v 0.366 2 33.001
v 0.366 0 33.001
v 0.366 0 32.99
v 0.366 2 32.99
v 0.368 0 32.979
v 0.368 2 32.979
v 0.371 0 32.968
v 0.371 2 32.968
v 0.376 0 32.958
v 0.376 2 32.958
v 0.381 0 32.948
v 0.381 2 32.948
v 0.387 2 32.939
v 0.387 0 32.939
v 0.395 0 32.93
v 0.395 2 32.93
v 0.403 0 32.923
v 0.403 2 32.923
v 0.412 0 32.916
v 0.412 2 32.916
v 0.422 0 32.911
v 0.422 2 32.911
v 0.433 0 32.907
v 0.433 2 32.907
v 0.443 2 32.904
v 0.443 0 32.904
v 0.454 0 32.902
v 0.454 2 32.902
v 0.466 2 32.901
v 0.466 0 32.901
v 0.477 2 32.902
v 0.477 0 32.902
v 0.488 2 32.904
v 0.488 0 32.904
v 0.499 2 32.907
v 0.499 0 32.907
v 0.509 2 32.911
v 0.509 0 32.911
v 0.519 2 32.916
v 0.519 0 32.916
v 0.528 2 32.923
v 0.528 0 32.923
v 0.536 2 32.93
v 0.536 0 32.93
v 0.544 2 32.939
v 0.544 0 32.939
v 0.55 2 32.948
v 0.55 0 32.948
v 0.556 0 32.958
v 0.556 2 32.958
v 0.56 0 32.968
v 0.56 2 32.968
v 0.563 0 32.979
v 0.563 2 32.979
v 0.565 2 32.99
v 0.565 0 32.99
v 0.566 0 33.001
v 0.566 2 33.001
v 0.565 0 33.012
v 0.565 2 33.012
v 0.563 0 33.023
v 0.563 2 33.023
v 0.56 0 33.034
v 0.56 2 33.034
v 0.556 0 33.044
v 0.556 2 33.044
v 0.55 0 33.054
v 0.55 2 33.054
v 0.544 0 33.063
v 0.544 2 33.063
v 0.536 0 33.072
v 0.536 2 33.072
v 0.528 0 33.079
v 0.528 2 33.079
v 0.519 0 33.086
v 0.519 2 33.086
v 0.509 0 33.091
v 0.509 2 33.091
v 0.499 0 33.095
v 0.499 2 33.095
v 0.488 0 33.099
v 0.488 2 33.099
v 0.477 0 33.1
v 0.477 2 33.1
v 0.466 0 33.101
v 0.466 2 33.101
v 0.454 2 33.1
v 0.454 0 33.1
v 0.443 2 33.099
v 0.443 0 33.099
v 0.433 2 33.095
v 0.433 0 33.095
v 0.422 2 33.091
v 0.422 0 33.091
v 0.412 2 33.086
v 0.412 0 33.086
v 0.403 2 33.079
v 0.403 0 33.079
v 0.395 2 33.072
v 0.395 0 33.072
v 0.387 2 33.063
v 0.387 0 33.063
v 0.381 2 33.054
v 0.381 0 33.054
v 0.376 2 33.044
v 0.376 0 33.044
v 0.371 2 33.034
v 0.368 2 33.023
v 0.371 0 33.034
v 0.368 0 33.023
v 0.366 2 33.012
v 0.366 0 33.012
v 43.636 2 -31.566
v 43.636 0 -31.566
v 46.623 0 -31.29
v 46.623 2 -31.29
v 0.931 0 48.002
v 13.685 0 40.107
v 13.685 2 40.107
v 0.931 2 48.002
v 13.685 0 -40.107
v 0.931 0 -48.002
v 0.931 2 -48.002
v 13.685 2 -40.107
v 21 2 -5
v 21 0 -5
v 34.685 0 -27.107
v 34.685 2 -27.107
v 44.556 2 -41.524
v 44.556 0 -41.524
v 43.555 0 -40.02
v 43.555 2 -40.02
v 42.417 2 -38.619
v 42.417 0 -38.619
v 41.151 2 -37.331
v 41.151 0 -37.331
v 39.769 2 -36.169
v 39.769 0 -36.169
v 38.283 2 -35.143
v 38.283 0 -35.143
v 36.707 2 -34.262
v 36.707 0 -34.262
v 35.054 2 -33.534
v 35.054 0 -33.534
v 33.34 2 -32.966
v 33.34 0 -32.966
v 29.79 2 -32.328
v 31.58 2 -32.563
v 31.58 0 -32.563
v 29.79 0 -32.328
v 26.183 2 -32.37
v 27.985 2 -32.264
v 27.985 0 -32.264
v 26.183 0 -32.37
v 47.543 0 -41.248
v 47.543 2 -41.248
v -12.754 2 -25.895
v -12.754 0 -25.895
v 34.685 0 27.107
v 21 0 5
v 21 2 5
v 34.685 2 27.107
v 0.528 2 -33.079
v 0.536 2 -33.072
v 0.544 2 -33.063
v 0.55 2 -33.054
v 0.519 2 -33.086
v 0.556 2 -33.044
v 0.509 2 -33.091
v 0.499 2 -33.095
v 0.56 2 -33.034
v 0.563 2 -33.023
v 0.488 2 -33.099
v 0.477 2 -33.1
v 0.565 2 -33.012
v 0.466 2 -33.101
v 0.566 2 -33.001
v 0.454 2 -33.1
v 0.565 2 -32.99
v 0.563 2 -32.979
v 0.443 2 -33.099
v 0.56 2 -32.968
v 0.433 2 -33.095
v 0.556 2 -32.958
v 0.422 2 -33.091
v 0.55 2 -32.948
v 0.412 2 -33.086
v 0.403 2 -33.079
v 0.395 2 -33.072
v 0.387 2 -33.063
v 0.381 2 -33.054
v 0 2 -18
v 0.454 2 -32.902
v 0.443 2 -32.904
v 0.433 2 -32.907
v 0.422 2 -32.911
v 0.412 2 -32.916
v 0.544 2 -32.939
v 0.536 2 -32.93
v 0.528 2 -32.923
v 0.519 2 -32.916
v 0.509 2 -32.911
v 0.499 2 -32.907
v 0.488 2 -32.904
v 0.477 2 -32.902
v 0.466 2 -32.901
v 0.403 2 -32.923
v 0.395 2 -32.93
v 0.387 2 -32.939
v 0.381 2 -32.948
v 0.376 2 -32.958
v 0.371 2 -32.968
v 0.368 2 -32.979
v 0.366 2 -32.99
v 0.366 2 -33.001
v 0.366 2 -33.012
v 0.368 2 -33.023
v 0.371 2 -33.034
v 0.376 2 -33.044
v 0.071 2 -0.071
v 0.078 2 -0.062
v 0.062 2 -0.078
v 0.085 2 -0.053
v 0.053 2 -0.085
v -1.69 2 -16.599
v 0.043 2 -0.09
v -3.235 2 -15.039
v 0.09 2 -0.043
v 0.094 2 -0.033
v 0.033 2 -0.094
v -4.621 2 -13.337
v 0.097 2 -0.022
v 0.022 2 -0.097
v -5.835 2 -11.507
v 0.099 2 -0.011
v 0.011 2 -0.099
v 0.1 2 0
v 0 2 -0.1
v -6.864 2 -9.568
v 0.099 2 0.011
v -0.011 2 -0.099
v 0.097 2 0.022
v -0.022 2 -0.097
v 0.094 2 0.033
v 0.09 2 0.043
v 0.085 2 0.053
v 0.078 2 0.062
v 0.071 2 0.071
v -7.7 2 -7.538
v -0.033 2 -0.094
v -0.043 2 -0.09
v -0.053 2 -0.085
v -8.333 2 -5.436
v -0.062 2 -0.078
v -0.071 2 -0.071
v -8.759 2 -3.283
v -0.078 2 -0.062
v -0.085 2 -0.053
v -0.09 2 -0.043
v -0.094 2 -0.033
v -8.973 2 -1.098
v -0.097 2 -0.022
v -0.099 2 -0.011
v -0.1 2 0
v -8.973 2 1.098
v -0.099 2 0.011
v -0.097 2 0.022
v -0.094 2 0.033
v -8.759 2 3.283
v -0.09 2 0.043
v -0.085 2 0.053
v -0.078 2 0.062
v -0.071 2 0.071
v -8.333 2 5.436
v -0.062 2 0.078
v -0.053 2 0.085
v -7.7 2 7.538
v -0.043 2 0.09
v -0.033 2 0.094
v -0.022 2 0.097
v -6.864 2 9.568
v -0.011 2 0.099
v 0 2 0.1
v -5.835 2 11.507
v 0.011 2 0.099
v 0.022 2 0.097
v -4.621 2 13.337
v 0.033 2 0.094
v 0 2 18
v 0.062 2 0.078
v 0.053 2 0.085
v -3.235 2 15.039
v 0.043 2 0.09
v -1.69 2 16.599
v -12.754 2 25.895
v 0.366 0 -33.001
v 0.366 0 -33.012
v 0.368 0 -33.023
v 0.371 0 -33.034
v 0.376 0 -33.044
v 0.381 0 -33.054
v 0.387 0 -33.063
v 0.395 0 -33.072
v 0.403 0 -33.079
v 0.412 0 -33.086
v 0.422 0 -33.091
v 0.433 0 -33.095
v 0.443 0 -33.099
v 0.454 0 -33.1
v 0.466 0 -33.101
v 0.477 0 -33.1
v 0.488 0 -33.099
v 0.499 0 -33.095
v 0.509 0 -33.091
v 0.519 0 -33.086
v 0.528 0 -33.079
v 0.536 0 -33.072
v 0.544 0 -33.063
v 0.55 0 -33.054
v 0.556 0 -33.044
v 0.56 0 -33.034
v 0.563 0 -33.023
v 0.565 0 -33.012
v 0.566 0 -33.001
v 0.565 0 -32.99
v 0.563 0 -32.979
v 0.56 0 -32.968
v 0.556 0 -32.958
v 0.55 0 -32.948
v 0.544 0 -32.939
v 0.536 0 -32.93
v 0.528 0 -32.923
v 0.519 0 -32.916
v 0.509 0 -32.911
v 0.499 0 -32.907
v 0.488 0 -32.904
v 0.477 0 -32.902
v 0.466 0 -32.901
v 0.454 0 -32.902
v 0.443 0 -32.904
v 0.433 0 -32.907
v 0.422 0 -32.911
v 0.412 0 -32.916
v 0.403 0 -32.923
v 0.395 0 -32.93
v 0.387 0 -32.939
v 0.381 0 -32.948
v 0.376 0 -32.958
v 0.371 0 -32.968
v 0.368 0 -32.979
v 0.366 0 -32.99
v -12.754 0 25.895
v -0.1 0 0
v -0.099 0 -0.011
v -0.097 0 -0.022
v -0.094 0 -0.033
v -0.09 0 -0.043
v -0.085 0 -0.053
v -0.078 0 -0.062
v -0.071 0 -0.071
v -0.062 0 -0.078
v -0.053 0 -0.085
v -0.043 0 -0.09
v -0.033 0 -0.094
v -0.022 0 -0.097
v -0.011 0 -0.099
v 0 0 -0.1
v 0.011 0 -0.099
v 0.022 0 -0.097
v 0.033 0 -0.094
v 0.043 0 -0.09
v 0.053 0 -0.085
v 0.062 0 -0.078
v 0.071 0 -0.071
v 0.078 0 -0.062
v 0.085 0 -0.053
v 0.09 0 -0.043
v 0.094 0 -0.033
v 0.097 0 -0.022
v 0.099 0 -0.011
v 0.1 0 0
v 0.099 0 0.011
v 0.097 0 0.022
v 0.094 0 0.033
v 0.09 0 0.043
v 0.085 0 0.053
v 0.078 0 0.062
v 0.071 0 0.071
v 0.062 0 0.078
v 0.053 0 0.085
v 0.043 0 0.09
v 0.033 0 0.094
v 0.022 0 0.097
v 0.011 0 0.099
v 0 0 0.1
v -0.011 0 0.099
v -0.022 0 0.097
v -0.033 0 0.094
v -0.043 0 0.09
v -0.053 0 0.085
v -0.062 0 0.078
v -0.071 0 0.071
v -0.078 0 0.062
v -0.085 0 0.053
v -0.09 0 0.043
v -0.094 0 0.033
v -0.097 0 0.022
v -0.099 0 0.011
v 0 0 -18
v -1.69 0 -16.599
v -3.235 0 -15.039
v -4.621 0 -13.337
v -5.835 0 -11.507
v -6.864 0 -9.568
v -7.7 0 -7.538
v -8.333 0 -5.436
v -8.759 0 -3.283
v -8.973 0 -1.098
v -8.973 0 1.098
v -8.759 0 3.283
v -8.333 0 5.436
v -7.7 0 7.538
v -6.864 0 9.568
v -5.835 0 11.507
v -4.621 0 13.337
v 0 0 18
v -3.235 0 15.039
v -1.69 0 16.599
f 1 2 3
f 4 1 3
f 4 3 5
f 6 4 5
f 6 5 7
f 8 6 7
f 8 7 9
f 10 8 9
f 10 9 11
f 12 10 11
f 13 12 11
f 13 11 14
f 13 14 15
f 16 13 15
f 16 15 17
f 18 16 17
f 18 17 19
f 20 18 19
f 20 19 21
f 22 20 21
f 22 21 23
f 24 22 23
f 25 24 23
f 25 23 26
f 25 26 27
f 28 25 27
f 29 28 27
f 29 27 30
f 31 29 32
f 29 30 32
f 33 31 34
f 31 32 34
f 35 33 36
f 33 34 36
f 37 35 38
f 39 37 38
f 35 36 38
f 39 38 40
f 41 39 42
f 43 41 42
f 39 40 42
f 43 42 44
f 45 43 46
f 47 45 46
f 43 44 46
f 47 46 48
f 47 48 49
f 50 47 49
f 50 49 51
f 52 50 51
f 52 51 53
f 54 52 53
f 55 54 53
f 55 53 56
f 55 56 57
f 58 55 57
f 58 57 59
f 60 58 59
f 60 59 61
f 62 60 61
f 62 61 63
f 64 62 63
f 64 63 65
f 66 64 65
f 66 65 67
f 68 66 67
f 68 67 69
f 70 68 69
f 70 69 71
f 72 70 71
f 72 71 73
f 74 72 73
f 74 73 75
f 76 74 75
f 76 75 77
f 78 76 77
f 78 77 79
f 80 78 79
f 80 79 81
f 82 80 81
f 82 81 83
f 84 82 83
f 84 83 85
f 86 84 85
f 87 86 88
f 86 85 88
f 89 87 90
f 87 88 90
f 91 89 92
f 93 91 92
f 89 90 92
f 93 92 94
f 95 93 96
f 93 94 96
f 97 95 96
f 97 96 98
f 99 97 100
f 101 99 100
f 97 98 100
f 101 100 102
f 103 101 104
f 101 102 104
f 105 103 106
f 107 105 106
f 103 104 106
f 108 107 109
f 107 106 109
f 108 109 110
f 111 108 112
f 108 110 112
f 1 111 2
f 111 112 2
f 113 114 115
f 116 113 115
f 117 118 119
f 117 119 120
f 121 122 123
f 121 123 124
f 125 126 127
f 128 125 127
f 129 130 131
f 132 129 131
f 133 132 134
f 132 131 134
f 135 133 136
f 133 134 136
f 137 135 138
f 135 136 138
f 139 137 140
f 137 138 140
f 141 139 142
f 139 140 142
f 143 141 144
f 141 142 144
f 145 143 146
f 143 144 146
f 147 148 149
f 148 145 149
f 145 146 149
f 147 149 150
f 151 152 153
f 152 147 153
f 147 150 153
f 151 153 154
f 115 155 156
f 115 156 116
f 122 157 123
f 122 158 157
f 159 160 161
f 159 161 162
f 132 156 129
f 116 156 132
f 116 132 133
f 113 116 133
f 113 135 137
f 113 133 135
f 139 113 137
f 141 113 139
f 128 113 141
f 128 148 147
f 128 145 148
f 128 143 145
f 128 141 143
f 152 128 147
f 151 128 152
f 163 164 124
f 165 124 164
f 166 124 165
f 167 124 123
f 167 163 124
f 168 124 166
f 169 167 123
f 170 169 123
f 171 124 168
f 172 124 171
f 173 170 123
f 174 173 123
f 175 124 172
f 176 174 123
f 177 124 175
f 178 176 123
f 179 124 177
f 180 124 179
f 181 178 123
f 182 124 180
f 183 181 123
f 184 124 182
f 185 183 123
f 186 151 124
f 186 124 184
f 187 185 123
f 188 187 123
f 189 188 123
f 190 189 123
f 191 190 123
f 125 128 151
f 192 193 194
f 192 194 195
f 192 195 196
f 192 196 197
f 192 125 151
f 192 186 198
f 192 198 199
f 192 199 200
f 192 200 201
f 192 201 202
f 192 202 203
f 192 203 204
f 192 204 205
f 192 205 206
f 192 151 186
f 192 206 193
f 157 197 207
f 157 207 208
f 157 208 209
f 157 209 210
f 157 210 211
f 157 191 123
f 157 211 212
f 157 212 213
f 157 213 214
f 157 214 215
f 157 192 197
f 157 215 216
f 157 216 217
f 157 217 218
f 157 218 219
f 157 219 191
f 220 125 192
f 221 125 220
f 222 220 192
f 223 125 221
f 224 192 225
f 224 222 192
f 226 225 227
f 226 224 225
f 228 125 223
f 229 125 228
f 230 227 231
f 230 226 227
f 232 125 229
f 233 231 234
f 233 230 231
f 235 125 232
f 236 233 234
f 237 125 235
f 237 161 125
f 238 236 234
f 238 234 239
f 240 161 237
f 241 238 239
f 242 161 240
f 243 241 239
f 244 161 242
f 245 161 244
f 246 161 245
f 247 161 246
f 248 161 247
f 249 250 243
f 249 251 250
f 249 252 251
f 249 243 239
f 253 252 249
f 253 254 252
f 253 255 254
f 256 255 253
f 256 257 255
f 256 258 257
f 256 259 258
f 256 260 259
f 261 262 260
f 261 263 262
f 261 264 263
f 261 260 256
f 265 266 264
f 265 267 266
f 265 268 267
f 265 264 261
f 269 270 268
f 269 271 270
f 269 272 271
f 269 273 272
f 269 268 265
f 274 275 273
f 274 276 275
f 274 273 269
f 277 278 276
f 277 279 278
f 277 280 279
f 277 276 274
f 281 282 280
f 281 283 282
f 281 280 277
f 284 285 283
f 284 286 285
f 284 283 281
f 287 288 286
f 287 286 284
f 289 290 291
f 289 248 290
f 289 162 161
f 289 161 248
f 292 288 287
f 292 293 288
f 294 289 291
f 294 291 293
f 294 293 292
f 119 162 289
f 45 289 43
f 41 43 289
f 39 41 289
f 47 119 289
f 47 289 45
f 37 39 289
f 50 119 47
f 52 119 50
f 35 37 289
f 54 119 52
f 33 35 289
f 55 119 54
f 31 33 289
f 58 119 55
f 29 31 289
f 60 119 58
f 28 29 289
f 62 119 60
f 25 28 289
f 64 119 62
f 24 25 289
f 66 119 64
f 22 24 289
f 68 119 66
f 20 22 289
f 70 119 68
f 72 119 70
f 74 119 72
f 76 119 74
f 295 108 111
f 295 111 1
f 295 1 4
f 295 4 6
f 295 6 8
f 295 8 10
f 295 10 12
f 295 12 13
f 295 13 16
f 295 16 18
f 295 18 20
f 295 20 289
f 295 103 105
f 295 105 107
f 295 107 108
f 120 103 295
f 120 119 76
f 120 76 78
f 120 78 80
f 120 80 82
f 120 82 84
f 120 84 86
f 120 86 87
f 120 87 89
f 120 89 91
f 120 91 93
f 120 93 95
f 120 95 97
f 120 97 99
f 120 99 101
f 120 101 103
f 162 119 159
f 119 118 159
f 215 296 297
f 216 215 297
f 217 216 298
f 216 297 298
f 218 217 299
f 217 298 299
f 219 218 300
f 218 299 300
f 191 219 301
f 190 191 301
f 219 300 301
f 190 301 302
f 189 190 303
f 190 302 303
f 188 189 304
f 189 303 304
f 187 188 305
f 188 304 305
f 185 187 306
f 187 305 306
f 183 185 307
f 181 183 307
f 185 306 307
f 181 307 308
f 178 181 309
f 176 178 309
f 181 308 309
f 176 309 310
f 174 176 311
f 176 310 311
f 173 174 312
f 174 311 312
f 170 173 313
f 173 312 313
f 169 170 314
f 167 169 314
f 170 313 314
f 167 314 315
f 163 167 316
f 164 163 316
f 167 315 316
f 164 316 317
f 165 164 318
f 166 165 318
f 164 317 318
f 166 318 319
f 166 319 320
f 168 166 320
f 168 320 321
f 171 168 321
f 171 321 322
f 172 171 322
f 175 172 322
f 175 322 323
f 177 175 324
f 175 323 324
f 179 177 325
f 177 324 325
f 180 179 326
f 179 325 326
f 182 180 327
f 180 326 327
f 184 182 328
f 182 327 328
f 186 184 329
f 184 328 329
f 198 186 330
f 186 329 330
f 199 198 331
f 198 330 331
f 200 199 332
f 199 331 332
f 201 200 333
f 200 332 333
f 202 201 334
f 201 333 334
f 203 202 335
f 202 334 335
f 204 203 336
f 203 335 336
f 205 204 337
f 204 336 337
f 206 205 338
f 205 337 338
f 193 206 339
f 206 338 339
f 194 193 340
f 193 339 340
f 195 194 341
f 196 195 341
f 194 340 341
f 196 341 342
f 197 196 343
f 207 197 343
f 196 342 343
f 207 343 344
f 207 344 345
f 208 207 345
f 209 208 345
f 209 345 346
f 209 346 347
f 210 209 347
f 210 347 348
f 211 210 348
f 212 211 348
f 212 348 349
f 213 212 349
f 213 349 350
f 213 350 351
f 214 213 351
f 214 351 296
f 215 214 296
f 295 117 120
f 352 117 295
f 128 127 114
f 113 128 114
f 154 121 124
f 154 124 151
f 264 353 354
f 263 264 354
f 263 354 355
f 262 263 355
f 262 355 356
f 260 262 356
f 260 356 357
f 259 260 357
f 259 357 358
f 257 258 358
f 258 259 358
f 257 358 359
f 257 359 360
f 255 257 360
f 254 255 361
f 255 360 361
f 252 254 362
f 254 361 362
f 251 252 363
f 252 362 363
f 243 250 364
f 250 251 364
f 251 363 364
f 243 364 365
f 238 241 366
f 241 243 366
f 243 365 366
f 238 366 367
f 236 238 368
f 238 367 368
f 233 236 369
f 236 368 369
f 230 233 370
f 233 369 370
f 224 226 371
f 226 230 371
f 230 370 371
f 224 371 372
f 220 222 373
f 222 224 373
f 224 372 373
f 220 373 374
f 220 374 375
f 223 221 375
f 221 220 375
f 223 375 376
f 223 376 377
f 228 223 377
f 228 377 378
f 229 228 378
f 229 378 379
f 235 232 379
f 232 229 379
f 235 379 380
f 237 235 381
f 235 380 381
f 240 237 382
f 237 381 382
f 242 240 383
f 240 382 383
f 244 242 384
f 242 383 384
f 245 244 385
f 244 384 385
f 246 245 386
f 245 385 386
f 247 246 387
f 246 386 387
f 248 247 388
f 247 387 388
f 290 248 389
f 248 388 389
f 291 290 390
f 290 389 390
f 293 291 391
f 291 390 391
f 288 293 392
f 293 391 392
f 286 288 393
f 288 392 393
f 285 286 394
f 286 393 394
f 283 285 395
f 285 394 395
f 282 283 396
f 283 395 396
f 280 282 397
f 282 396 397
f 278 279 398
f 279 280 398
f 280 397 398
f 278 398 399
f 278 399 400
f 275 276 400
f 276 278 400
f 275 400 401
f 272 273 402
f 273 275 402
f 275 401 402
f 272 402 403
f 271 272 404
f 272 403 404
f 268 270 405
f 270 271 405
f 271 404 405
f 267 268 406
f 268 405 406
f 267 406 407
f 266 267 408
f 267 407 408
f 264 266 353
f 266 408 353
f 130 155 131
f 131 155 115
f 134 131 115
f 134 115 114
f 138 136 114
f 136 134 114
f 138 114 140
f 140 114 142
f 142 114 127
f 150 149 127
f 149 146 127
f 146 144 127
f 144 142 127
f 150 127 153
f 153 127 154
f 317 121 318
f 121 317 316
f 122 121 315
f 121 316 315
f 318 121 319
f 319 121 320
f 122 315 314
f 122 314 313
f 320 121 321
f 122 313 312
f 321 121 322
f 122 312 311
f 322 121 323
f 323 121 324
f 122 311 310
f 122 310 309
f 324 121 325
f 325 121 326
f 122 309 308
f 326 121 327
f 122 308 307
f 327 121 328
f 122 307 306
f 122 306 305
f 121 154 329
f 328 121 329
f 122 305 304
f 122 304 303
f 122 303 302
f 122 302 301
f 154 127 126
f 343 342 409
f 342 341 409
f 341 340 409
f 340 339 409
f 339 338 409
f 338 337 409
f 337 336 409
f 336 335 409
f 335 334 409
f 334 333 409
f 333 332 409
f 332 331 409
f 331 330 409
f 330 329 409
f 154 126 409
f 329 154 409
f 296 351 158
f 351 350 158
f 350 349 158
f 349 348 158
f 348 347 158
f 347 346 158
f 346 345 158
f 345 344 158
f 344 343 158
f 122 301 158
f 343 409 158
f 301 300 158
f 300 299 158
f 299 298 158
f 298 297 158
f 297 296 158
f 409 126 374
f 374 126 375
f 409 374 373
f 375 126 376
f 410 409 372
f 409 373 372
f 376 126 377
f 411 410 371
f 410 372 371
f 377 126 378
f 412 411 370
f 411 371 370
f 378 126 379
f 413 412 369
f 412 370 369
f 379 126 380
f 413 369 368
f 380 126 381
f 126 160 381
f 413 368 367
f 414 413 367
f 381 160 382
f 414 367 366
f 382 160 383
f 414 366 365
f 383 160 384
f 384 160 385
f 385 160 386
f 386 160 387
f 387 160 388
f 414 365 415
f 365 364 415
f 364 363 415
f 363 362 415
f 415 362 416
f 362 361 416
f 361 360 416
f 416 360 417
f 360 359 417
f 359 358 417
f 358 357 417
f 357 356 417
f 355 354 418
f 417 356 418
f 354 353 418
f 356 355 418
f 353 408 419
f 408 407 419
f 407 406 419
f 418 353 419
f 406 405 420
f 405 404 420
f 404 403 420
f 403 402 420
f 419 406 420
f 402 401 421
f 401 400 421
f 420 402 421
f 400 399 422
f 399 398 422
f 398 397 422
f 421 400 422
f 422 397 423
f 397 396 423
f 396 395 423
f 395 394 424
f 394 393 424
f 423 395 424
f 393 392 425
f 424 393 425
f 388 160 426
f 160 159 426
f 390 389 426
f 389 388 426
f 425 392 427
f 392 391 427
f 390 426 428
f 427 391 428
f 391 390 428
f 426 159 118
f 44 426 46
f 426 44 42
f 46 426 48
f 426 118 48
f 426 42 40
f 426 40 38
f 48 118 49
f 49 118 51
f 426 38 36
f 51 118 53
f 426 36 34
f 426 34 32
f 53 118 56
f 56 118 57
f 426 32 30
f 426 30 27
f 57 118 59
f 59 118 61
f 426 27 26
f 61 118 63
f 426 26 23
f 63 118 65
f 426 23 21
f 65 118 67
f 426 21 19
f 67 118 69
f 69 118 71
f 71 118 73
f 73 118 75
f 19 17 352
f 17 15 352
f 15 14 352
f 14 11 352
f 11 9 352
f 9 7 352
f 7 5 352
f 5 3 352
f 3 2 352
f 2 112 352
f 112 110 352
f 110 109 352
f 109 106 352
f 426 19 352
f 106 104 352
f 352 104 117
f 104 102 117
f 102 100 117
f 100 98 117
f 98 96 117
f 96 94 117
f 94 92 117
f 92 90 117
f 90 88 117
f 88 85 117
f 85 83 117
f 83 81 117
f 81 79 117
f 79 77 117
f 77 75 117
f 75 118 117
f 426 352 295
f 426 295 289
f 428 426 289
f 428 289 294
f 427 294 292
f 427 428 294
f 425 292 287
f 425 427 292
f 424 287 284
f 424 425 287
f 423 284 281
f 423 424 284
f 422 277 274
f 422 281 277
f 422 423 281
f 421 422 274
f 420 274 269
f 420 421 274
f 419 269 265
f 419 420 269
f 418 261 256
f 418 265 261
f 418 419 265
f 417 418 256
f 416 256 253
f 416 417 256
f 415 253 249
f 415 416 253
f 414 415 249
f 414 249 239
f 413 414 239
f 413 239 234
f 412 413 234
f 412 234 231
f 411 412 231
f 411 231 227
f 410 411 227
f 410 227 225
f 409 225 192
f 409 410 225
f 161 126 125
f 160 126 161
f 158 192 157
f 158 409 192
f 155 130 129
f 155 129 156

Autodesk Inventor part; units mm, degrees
ref_plane "YZ Plane" through (0, 0, 0) normal (1, 0, 0) x (0, 1, 0)
ref_plane "XZ Plane" through (0, 0, 0) normal (0, 1, 0) x (-1, 0, 0)
ref_plane "XY Plane" through (0, 0, 0) normal (0, 0, 1) x (1, 0, 0)
sketch "Sketch1" plane through (0, 0, 0) normal (0, 1, 0) x (-1, 0, 0)
  line L0 (-21, -5) -> (-21, 5)
  line L1 (0, -18) -> (-21, -5)
  line L2 (0, 18) -> (-21, 5)
  line L3 (-21, -5) -> (-34.6852, -27.1069)
  line L4 (0, -18) -> (-13.6852, -40.1069)
  line L5 (-13.6852, -40.1069) -> (-34.6852, -27.1069)
  line L6 (-21, 5) -> (-34.6852, 27.1069)
  line L7 (0, 18) -> (-13.6852, 40.1069)
  line L8 (-13.6852, 40.1069) -> (-34.6852, 27.1069)
  arc A0 (0, -18) -> (0, 18) centre (-13.5, 0) ccw
  circle A1 centre (0, 0) radius 0.1
  line L9 (-13.6852, -40.1069) -> (0, -18)
  line L10 (0, -18) -> (12.754, -25.8953)
  line L11 (12.754, -25.8953) -> (-0.9312, -48.0022)
  line L12 (-0.9312, -48.0022) -> (-13.6852, -40.1069)
  line L13 (0, 18) -> (-13.6852, 40.1069)
  line L14 (-13.6852, 40.1069) -> (-0.9312, 48.0022)
  line L15 (-0.9312, 48.0022) -> (12.754, 25.8953)
  line L16 (12.754, 25.8953) -> (0, 18)
  line L17 (-34.6852, -27.1069) -> (-43.636, -31.5659)
  line L18 (-44.556, -41.5235) -> (-43.636, -31.5659)
  arc A2 (-26.1826, -32.3704) -> (-44.556, -41.5235) centre (-28.2096, -51.3191) ccw
  line L19 (-26.1826, -32.3704) -> (-34.6852, -27.1069)
  line L20 (-34.6852, -27.1069) -> (-43.636, -31.5659)
  line L21 (-43.636, -31.5659) -> (-44.556, -41.5235)
  arc A3 (-26.1826, -32.3704) -> (-44.556, -41.5235) centre (-28.2096, -51.3191) ccw
  line L22 (-43.636, -31.5659) -> (-46.6233, -31.2899)
  line L23 (-44.556, -41.5235) -> (-47.5433, -41.2475)
  line L24 (-47.5433, -41.2475) -> (-46.6233, -31.2899)
  line L25 (5.9114, -36.9488) -> (-6.8426, -29.0534)
  line L26 (5.9114, 36.9488) -> (-6.8426, 29.0534)
  circle A4 centre (-0.4656, -33.0011) radius 0.1
  circle A5 centre (-0.4656, 33.0011) radius 0.1
  point P0 (-21, 0)
  point P1 (-39.1606, -29.3364)
  dimension "d5" = 10
  dimension "d6" = 26
  dimension "d7" = 26
  dimension "d8" = 26
  dimension "d9" = 26
  dimension "d10" = 36
  dimension "d12" = 0.2
  dimension "d13" = 15
  dimension "d14" = 15
  dimension "d22" = 3
  dimension "d25" = 0.2
  dimension "d26" = 0.2
extrude "Extrusion1" add sketch "Sketch1" along normal blind 2 contours L0 L2 A0 L1 | L1 L4 L5 L3 | L6 L8 L7 L2 | L10 L11 L25 A4 L4 | L7 L26 A5 L15 L16 | L25 A4 L11 L12 L4 | L7 L14 L15 L26 A5 | A4 L25 | L25 A4 | A5 L26 | L26 A5
extrude "Extrusion2" add sketch "Sketch1" along normal blind 2 contours L5 A2 L18 L17
extrude "Extrusion3" add sketch "Sketch1" along normal blind 2 contours L18 L23 L24 L22
extrude "Extrusion4" cut sketch "Sketch1" along normal blind 2 contours A4 L25 | L25 A4 | A5 L26 | L26 A5
properties part number "drzak_buzirka"
